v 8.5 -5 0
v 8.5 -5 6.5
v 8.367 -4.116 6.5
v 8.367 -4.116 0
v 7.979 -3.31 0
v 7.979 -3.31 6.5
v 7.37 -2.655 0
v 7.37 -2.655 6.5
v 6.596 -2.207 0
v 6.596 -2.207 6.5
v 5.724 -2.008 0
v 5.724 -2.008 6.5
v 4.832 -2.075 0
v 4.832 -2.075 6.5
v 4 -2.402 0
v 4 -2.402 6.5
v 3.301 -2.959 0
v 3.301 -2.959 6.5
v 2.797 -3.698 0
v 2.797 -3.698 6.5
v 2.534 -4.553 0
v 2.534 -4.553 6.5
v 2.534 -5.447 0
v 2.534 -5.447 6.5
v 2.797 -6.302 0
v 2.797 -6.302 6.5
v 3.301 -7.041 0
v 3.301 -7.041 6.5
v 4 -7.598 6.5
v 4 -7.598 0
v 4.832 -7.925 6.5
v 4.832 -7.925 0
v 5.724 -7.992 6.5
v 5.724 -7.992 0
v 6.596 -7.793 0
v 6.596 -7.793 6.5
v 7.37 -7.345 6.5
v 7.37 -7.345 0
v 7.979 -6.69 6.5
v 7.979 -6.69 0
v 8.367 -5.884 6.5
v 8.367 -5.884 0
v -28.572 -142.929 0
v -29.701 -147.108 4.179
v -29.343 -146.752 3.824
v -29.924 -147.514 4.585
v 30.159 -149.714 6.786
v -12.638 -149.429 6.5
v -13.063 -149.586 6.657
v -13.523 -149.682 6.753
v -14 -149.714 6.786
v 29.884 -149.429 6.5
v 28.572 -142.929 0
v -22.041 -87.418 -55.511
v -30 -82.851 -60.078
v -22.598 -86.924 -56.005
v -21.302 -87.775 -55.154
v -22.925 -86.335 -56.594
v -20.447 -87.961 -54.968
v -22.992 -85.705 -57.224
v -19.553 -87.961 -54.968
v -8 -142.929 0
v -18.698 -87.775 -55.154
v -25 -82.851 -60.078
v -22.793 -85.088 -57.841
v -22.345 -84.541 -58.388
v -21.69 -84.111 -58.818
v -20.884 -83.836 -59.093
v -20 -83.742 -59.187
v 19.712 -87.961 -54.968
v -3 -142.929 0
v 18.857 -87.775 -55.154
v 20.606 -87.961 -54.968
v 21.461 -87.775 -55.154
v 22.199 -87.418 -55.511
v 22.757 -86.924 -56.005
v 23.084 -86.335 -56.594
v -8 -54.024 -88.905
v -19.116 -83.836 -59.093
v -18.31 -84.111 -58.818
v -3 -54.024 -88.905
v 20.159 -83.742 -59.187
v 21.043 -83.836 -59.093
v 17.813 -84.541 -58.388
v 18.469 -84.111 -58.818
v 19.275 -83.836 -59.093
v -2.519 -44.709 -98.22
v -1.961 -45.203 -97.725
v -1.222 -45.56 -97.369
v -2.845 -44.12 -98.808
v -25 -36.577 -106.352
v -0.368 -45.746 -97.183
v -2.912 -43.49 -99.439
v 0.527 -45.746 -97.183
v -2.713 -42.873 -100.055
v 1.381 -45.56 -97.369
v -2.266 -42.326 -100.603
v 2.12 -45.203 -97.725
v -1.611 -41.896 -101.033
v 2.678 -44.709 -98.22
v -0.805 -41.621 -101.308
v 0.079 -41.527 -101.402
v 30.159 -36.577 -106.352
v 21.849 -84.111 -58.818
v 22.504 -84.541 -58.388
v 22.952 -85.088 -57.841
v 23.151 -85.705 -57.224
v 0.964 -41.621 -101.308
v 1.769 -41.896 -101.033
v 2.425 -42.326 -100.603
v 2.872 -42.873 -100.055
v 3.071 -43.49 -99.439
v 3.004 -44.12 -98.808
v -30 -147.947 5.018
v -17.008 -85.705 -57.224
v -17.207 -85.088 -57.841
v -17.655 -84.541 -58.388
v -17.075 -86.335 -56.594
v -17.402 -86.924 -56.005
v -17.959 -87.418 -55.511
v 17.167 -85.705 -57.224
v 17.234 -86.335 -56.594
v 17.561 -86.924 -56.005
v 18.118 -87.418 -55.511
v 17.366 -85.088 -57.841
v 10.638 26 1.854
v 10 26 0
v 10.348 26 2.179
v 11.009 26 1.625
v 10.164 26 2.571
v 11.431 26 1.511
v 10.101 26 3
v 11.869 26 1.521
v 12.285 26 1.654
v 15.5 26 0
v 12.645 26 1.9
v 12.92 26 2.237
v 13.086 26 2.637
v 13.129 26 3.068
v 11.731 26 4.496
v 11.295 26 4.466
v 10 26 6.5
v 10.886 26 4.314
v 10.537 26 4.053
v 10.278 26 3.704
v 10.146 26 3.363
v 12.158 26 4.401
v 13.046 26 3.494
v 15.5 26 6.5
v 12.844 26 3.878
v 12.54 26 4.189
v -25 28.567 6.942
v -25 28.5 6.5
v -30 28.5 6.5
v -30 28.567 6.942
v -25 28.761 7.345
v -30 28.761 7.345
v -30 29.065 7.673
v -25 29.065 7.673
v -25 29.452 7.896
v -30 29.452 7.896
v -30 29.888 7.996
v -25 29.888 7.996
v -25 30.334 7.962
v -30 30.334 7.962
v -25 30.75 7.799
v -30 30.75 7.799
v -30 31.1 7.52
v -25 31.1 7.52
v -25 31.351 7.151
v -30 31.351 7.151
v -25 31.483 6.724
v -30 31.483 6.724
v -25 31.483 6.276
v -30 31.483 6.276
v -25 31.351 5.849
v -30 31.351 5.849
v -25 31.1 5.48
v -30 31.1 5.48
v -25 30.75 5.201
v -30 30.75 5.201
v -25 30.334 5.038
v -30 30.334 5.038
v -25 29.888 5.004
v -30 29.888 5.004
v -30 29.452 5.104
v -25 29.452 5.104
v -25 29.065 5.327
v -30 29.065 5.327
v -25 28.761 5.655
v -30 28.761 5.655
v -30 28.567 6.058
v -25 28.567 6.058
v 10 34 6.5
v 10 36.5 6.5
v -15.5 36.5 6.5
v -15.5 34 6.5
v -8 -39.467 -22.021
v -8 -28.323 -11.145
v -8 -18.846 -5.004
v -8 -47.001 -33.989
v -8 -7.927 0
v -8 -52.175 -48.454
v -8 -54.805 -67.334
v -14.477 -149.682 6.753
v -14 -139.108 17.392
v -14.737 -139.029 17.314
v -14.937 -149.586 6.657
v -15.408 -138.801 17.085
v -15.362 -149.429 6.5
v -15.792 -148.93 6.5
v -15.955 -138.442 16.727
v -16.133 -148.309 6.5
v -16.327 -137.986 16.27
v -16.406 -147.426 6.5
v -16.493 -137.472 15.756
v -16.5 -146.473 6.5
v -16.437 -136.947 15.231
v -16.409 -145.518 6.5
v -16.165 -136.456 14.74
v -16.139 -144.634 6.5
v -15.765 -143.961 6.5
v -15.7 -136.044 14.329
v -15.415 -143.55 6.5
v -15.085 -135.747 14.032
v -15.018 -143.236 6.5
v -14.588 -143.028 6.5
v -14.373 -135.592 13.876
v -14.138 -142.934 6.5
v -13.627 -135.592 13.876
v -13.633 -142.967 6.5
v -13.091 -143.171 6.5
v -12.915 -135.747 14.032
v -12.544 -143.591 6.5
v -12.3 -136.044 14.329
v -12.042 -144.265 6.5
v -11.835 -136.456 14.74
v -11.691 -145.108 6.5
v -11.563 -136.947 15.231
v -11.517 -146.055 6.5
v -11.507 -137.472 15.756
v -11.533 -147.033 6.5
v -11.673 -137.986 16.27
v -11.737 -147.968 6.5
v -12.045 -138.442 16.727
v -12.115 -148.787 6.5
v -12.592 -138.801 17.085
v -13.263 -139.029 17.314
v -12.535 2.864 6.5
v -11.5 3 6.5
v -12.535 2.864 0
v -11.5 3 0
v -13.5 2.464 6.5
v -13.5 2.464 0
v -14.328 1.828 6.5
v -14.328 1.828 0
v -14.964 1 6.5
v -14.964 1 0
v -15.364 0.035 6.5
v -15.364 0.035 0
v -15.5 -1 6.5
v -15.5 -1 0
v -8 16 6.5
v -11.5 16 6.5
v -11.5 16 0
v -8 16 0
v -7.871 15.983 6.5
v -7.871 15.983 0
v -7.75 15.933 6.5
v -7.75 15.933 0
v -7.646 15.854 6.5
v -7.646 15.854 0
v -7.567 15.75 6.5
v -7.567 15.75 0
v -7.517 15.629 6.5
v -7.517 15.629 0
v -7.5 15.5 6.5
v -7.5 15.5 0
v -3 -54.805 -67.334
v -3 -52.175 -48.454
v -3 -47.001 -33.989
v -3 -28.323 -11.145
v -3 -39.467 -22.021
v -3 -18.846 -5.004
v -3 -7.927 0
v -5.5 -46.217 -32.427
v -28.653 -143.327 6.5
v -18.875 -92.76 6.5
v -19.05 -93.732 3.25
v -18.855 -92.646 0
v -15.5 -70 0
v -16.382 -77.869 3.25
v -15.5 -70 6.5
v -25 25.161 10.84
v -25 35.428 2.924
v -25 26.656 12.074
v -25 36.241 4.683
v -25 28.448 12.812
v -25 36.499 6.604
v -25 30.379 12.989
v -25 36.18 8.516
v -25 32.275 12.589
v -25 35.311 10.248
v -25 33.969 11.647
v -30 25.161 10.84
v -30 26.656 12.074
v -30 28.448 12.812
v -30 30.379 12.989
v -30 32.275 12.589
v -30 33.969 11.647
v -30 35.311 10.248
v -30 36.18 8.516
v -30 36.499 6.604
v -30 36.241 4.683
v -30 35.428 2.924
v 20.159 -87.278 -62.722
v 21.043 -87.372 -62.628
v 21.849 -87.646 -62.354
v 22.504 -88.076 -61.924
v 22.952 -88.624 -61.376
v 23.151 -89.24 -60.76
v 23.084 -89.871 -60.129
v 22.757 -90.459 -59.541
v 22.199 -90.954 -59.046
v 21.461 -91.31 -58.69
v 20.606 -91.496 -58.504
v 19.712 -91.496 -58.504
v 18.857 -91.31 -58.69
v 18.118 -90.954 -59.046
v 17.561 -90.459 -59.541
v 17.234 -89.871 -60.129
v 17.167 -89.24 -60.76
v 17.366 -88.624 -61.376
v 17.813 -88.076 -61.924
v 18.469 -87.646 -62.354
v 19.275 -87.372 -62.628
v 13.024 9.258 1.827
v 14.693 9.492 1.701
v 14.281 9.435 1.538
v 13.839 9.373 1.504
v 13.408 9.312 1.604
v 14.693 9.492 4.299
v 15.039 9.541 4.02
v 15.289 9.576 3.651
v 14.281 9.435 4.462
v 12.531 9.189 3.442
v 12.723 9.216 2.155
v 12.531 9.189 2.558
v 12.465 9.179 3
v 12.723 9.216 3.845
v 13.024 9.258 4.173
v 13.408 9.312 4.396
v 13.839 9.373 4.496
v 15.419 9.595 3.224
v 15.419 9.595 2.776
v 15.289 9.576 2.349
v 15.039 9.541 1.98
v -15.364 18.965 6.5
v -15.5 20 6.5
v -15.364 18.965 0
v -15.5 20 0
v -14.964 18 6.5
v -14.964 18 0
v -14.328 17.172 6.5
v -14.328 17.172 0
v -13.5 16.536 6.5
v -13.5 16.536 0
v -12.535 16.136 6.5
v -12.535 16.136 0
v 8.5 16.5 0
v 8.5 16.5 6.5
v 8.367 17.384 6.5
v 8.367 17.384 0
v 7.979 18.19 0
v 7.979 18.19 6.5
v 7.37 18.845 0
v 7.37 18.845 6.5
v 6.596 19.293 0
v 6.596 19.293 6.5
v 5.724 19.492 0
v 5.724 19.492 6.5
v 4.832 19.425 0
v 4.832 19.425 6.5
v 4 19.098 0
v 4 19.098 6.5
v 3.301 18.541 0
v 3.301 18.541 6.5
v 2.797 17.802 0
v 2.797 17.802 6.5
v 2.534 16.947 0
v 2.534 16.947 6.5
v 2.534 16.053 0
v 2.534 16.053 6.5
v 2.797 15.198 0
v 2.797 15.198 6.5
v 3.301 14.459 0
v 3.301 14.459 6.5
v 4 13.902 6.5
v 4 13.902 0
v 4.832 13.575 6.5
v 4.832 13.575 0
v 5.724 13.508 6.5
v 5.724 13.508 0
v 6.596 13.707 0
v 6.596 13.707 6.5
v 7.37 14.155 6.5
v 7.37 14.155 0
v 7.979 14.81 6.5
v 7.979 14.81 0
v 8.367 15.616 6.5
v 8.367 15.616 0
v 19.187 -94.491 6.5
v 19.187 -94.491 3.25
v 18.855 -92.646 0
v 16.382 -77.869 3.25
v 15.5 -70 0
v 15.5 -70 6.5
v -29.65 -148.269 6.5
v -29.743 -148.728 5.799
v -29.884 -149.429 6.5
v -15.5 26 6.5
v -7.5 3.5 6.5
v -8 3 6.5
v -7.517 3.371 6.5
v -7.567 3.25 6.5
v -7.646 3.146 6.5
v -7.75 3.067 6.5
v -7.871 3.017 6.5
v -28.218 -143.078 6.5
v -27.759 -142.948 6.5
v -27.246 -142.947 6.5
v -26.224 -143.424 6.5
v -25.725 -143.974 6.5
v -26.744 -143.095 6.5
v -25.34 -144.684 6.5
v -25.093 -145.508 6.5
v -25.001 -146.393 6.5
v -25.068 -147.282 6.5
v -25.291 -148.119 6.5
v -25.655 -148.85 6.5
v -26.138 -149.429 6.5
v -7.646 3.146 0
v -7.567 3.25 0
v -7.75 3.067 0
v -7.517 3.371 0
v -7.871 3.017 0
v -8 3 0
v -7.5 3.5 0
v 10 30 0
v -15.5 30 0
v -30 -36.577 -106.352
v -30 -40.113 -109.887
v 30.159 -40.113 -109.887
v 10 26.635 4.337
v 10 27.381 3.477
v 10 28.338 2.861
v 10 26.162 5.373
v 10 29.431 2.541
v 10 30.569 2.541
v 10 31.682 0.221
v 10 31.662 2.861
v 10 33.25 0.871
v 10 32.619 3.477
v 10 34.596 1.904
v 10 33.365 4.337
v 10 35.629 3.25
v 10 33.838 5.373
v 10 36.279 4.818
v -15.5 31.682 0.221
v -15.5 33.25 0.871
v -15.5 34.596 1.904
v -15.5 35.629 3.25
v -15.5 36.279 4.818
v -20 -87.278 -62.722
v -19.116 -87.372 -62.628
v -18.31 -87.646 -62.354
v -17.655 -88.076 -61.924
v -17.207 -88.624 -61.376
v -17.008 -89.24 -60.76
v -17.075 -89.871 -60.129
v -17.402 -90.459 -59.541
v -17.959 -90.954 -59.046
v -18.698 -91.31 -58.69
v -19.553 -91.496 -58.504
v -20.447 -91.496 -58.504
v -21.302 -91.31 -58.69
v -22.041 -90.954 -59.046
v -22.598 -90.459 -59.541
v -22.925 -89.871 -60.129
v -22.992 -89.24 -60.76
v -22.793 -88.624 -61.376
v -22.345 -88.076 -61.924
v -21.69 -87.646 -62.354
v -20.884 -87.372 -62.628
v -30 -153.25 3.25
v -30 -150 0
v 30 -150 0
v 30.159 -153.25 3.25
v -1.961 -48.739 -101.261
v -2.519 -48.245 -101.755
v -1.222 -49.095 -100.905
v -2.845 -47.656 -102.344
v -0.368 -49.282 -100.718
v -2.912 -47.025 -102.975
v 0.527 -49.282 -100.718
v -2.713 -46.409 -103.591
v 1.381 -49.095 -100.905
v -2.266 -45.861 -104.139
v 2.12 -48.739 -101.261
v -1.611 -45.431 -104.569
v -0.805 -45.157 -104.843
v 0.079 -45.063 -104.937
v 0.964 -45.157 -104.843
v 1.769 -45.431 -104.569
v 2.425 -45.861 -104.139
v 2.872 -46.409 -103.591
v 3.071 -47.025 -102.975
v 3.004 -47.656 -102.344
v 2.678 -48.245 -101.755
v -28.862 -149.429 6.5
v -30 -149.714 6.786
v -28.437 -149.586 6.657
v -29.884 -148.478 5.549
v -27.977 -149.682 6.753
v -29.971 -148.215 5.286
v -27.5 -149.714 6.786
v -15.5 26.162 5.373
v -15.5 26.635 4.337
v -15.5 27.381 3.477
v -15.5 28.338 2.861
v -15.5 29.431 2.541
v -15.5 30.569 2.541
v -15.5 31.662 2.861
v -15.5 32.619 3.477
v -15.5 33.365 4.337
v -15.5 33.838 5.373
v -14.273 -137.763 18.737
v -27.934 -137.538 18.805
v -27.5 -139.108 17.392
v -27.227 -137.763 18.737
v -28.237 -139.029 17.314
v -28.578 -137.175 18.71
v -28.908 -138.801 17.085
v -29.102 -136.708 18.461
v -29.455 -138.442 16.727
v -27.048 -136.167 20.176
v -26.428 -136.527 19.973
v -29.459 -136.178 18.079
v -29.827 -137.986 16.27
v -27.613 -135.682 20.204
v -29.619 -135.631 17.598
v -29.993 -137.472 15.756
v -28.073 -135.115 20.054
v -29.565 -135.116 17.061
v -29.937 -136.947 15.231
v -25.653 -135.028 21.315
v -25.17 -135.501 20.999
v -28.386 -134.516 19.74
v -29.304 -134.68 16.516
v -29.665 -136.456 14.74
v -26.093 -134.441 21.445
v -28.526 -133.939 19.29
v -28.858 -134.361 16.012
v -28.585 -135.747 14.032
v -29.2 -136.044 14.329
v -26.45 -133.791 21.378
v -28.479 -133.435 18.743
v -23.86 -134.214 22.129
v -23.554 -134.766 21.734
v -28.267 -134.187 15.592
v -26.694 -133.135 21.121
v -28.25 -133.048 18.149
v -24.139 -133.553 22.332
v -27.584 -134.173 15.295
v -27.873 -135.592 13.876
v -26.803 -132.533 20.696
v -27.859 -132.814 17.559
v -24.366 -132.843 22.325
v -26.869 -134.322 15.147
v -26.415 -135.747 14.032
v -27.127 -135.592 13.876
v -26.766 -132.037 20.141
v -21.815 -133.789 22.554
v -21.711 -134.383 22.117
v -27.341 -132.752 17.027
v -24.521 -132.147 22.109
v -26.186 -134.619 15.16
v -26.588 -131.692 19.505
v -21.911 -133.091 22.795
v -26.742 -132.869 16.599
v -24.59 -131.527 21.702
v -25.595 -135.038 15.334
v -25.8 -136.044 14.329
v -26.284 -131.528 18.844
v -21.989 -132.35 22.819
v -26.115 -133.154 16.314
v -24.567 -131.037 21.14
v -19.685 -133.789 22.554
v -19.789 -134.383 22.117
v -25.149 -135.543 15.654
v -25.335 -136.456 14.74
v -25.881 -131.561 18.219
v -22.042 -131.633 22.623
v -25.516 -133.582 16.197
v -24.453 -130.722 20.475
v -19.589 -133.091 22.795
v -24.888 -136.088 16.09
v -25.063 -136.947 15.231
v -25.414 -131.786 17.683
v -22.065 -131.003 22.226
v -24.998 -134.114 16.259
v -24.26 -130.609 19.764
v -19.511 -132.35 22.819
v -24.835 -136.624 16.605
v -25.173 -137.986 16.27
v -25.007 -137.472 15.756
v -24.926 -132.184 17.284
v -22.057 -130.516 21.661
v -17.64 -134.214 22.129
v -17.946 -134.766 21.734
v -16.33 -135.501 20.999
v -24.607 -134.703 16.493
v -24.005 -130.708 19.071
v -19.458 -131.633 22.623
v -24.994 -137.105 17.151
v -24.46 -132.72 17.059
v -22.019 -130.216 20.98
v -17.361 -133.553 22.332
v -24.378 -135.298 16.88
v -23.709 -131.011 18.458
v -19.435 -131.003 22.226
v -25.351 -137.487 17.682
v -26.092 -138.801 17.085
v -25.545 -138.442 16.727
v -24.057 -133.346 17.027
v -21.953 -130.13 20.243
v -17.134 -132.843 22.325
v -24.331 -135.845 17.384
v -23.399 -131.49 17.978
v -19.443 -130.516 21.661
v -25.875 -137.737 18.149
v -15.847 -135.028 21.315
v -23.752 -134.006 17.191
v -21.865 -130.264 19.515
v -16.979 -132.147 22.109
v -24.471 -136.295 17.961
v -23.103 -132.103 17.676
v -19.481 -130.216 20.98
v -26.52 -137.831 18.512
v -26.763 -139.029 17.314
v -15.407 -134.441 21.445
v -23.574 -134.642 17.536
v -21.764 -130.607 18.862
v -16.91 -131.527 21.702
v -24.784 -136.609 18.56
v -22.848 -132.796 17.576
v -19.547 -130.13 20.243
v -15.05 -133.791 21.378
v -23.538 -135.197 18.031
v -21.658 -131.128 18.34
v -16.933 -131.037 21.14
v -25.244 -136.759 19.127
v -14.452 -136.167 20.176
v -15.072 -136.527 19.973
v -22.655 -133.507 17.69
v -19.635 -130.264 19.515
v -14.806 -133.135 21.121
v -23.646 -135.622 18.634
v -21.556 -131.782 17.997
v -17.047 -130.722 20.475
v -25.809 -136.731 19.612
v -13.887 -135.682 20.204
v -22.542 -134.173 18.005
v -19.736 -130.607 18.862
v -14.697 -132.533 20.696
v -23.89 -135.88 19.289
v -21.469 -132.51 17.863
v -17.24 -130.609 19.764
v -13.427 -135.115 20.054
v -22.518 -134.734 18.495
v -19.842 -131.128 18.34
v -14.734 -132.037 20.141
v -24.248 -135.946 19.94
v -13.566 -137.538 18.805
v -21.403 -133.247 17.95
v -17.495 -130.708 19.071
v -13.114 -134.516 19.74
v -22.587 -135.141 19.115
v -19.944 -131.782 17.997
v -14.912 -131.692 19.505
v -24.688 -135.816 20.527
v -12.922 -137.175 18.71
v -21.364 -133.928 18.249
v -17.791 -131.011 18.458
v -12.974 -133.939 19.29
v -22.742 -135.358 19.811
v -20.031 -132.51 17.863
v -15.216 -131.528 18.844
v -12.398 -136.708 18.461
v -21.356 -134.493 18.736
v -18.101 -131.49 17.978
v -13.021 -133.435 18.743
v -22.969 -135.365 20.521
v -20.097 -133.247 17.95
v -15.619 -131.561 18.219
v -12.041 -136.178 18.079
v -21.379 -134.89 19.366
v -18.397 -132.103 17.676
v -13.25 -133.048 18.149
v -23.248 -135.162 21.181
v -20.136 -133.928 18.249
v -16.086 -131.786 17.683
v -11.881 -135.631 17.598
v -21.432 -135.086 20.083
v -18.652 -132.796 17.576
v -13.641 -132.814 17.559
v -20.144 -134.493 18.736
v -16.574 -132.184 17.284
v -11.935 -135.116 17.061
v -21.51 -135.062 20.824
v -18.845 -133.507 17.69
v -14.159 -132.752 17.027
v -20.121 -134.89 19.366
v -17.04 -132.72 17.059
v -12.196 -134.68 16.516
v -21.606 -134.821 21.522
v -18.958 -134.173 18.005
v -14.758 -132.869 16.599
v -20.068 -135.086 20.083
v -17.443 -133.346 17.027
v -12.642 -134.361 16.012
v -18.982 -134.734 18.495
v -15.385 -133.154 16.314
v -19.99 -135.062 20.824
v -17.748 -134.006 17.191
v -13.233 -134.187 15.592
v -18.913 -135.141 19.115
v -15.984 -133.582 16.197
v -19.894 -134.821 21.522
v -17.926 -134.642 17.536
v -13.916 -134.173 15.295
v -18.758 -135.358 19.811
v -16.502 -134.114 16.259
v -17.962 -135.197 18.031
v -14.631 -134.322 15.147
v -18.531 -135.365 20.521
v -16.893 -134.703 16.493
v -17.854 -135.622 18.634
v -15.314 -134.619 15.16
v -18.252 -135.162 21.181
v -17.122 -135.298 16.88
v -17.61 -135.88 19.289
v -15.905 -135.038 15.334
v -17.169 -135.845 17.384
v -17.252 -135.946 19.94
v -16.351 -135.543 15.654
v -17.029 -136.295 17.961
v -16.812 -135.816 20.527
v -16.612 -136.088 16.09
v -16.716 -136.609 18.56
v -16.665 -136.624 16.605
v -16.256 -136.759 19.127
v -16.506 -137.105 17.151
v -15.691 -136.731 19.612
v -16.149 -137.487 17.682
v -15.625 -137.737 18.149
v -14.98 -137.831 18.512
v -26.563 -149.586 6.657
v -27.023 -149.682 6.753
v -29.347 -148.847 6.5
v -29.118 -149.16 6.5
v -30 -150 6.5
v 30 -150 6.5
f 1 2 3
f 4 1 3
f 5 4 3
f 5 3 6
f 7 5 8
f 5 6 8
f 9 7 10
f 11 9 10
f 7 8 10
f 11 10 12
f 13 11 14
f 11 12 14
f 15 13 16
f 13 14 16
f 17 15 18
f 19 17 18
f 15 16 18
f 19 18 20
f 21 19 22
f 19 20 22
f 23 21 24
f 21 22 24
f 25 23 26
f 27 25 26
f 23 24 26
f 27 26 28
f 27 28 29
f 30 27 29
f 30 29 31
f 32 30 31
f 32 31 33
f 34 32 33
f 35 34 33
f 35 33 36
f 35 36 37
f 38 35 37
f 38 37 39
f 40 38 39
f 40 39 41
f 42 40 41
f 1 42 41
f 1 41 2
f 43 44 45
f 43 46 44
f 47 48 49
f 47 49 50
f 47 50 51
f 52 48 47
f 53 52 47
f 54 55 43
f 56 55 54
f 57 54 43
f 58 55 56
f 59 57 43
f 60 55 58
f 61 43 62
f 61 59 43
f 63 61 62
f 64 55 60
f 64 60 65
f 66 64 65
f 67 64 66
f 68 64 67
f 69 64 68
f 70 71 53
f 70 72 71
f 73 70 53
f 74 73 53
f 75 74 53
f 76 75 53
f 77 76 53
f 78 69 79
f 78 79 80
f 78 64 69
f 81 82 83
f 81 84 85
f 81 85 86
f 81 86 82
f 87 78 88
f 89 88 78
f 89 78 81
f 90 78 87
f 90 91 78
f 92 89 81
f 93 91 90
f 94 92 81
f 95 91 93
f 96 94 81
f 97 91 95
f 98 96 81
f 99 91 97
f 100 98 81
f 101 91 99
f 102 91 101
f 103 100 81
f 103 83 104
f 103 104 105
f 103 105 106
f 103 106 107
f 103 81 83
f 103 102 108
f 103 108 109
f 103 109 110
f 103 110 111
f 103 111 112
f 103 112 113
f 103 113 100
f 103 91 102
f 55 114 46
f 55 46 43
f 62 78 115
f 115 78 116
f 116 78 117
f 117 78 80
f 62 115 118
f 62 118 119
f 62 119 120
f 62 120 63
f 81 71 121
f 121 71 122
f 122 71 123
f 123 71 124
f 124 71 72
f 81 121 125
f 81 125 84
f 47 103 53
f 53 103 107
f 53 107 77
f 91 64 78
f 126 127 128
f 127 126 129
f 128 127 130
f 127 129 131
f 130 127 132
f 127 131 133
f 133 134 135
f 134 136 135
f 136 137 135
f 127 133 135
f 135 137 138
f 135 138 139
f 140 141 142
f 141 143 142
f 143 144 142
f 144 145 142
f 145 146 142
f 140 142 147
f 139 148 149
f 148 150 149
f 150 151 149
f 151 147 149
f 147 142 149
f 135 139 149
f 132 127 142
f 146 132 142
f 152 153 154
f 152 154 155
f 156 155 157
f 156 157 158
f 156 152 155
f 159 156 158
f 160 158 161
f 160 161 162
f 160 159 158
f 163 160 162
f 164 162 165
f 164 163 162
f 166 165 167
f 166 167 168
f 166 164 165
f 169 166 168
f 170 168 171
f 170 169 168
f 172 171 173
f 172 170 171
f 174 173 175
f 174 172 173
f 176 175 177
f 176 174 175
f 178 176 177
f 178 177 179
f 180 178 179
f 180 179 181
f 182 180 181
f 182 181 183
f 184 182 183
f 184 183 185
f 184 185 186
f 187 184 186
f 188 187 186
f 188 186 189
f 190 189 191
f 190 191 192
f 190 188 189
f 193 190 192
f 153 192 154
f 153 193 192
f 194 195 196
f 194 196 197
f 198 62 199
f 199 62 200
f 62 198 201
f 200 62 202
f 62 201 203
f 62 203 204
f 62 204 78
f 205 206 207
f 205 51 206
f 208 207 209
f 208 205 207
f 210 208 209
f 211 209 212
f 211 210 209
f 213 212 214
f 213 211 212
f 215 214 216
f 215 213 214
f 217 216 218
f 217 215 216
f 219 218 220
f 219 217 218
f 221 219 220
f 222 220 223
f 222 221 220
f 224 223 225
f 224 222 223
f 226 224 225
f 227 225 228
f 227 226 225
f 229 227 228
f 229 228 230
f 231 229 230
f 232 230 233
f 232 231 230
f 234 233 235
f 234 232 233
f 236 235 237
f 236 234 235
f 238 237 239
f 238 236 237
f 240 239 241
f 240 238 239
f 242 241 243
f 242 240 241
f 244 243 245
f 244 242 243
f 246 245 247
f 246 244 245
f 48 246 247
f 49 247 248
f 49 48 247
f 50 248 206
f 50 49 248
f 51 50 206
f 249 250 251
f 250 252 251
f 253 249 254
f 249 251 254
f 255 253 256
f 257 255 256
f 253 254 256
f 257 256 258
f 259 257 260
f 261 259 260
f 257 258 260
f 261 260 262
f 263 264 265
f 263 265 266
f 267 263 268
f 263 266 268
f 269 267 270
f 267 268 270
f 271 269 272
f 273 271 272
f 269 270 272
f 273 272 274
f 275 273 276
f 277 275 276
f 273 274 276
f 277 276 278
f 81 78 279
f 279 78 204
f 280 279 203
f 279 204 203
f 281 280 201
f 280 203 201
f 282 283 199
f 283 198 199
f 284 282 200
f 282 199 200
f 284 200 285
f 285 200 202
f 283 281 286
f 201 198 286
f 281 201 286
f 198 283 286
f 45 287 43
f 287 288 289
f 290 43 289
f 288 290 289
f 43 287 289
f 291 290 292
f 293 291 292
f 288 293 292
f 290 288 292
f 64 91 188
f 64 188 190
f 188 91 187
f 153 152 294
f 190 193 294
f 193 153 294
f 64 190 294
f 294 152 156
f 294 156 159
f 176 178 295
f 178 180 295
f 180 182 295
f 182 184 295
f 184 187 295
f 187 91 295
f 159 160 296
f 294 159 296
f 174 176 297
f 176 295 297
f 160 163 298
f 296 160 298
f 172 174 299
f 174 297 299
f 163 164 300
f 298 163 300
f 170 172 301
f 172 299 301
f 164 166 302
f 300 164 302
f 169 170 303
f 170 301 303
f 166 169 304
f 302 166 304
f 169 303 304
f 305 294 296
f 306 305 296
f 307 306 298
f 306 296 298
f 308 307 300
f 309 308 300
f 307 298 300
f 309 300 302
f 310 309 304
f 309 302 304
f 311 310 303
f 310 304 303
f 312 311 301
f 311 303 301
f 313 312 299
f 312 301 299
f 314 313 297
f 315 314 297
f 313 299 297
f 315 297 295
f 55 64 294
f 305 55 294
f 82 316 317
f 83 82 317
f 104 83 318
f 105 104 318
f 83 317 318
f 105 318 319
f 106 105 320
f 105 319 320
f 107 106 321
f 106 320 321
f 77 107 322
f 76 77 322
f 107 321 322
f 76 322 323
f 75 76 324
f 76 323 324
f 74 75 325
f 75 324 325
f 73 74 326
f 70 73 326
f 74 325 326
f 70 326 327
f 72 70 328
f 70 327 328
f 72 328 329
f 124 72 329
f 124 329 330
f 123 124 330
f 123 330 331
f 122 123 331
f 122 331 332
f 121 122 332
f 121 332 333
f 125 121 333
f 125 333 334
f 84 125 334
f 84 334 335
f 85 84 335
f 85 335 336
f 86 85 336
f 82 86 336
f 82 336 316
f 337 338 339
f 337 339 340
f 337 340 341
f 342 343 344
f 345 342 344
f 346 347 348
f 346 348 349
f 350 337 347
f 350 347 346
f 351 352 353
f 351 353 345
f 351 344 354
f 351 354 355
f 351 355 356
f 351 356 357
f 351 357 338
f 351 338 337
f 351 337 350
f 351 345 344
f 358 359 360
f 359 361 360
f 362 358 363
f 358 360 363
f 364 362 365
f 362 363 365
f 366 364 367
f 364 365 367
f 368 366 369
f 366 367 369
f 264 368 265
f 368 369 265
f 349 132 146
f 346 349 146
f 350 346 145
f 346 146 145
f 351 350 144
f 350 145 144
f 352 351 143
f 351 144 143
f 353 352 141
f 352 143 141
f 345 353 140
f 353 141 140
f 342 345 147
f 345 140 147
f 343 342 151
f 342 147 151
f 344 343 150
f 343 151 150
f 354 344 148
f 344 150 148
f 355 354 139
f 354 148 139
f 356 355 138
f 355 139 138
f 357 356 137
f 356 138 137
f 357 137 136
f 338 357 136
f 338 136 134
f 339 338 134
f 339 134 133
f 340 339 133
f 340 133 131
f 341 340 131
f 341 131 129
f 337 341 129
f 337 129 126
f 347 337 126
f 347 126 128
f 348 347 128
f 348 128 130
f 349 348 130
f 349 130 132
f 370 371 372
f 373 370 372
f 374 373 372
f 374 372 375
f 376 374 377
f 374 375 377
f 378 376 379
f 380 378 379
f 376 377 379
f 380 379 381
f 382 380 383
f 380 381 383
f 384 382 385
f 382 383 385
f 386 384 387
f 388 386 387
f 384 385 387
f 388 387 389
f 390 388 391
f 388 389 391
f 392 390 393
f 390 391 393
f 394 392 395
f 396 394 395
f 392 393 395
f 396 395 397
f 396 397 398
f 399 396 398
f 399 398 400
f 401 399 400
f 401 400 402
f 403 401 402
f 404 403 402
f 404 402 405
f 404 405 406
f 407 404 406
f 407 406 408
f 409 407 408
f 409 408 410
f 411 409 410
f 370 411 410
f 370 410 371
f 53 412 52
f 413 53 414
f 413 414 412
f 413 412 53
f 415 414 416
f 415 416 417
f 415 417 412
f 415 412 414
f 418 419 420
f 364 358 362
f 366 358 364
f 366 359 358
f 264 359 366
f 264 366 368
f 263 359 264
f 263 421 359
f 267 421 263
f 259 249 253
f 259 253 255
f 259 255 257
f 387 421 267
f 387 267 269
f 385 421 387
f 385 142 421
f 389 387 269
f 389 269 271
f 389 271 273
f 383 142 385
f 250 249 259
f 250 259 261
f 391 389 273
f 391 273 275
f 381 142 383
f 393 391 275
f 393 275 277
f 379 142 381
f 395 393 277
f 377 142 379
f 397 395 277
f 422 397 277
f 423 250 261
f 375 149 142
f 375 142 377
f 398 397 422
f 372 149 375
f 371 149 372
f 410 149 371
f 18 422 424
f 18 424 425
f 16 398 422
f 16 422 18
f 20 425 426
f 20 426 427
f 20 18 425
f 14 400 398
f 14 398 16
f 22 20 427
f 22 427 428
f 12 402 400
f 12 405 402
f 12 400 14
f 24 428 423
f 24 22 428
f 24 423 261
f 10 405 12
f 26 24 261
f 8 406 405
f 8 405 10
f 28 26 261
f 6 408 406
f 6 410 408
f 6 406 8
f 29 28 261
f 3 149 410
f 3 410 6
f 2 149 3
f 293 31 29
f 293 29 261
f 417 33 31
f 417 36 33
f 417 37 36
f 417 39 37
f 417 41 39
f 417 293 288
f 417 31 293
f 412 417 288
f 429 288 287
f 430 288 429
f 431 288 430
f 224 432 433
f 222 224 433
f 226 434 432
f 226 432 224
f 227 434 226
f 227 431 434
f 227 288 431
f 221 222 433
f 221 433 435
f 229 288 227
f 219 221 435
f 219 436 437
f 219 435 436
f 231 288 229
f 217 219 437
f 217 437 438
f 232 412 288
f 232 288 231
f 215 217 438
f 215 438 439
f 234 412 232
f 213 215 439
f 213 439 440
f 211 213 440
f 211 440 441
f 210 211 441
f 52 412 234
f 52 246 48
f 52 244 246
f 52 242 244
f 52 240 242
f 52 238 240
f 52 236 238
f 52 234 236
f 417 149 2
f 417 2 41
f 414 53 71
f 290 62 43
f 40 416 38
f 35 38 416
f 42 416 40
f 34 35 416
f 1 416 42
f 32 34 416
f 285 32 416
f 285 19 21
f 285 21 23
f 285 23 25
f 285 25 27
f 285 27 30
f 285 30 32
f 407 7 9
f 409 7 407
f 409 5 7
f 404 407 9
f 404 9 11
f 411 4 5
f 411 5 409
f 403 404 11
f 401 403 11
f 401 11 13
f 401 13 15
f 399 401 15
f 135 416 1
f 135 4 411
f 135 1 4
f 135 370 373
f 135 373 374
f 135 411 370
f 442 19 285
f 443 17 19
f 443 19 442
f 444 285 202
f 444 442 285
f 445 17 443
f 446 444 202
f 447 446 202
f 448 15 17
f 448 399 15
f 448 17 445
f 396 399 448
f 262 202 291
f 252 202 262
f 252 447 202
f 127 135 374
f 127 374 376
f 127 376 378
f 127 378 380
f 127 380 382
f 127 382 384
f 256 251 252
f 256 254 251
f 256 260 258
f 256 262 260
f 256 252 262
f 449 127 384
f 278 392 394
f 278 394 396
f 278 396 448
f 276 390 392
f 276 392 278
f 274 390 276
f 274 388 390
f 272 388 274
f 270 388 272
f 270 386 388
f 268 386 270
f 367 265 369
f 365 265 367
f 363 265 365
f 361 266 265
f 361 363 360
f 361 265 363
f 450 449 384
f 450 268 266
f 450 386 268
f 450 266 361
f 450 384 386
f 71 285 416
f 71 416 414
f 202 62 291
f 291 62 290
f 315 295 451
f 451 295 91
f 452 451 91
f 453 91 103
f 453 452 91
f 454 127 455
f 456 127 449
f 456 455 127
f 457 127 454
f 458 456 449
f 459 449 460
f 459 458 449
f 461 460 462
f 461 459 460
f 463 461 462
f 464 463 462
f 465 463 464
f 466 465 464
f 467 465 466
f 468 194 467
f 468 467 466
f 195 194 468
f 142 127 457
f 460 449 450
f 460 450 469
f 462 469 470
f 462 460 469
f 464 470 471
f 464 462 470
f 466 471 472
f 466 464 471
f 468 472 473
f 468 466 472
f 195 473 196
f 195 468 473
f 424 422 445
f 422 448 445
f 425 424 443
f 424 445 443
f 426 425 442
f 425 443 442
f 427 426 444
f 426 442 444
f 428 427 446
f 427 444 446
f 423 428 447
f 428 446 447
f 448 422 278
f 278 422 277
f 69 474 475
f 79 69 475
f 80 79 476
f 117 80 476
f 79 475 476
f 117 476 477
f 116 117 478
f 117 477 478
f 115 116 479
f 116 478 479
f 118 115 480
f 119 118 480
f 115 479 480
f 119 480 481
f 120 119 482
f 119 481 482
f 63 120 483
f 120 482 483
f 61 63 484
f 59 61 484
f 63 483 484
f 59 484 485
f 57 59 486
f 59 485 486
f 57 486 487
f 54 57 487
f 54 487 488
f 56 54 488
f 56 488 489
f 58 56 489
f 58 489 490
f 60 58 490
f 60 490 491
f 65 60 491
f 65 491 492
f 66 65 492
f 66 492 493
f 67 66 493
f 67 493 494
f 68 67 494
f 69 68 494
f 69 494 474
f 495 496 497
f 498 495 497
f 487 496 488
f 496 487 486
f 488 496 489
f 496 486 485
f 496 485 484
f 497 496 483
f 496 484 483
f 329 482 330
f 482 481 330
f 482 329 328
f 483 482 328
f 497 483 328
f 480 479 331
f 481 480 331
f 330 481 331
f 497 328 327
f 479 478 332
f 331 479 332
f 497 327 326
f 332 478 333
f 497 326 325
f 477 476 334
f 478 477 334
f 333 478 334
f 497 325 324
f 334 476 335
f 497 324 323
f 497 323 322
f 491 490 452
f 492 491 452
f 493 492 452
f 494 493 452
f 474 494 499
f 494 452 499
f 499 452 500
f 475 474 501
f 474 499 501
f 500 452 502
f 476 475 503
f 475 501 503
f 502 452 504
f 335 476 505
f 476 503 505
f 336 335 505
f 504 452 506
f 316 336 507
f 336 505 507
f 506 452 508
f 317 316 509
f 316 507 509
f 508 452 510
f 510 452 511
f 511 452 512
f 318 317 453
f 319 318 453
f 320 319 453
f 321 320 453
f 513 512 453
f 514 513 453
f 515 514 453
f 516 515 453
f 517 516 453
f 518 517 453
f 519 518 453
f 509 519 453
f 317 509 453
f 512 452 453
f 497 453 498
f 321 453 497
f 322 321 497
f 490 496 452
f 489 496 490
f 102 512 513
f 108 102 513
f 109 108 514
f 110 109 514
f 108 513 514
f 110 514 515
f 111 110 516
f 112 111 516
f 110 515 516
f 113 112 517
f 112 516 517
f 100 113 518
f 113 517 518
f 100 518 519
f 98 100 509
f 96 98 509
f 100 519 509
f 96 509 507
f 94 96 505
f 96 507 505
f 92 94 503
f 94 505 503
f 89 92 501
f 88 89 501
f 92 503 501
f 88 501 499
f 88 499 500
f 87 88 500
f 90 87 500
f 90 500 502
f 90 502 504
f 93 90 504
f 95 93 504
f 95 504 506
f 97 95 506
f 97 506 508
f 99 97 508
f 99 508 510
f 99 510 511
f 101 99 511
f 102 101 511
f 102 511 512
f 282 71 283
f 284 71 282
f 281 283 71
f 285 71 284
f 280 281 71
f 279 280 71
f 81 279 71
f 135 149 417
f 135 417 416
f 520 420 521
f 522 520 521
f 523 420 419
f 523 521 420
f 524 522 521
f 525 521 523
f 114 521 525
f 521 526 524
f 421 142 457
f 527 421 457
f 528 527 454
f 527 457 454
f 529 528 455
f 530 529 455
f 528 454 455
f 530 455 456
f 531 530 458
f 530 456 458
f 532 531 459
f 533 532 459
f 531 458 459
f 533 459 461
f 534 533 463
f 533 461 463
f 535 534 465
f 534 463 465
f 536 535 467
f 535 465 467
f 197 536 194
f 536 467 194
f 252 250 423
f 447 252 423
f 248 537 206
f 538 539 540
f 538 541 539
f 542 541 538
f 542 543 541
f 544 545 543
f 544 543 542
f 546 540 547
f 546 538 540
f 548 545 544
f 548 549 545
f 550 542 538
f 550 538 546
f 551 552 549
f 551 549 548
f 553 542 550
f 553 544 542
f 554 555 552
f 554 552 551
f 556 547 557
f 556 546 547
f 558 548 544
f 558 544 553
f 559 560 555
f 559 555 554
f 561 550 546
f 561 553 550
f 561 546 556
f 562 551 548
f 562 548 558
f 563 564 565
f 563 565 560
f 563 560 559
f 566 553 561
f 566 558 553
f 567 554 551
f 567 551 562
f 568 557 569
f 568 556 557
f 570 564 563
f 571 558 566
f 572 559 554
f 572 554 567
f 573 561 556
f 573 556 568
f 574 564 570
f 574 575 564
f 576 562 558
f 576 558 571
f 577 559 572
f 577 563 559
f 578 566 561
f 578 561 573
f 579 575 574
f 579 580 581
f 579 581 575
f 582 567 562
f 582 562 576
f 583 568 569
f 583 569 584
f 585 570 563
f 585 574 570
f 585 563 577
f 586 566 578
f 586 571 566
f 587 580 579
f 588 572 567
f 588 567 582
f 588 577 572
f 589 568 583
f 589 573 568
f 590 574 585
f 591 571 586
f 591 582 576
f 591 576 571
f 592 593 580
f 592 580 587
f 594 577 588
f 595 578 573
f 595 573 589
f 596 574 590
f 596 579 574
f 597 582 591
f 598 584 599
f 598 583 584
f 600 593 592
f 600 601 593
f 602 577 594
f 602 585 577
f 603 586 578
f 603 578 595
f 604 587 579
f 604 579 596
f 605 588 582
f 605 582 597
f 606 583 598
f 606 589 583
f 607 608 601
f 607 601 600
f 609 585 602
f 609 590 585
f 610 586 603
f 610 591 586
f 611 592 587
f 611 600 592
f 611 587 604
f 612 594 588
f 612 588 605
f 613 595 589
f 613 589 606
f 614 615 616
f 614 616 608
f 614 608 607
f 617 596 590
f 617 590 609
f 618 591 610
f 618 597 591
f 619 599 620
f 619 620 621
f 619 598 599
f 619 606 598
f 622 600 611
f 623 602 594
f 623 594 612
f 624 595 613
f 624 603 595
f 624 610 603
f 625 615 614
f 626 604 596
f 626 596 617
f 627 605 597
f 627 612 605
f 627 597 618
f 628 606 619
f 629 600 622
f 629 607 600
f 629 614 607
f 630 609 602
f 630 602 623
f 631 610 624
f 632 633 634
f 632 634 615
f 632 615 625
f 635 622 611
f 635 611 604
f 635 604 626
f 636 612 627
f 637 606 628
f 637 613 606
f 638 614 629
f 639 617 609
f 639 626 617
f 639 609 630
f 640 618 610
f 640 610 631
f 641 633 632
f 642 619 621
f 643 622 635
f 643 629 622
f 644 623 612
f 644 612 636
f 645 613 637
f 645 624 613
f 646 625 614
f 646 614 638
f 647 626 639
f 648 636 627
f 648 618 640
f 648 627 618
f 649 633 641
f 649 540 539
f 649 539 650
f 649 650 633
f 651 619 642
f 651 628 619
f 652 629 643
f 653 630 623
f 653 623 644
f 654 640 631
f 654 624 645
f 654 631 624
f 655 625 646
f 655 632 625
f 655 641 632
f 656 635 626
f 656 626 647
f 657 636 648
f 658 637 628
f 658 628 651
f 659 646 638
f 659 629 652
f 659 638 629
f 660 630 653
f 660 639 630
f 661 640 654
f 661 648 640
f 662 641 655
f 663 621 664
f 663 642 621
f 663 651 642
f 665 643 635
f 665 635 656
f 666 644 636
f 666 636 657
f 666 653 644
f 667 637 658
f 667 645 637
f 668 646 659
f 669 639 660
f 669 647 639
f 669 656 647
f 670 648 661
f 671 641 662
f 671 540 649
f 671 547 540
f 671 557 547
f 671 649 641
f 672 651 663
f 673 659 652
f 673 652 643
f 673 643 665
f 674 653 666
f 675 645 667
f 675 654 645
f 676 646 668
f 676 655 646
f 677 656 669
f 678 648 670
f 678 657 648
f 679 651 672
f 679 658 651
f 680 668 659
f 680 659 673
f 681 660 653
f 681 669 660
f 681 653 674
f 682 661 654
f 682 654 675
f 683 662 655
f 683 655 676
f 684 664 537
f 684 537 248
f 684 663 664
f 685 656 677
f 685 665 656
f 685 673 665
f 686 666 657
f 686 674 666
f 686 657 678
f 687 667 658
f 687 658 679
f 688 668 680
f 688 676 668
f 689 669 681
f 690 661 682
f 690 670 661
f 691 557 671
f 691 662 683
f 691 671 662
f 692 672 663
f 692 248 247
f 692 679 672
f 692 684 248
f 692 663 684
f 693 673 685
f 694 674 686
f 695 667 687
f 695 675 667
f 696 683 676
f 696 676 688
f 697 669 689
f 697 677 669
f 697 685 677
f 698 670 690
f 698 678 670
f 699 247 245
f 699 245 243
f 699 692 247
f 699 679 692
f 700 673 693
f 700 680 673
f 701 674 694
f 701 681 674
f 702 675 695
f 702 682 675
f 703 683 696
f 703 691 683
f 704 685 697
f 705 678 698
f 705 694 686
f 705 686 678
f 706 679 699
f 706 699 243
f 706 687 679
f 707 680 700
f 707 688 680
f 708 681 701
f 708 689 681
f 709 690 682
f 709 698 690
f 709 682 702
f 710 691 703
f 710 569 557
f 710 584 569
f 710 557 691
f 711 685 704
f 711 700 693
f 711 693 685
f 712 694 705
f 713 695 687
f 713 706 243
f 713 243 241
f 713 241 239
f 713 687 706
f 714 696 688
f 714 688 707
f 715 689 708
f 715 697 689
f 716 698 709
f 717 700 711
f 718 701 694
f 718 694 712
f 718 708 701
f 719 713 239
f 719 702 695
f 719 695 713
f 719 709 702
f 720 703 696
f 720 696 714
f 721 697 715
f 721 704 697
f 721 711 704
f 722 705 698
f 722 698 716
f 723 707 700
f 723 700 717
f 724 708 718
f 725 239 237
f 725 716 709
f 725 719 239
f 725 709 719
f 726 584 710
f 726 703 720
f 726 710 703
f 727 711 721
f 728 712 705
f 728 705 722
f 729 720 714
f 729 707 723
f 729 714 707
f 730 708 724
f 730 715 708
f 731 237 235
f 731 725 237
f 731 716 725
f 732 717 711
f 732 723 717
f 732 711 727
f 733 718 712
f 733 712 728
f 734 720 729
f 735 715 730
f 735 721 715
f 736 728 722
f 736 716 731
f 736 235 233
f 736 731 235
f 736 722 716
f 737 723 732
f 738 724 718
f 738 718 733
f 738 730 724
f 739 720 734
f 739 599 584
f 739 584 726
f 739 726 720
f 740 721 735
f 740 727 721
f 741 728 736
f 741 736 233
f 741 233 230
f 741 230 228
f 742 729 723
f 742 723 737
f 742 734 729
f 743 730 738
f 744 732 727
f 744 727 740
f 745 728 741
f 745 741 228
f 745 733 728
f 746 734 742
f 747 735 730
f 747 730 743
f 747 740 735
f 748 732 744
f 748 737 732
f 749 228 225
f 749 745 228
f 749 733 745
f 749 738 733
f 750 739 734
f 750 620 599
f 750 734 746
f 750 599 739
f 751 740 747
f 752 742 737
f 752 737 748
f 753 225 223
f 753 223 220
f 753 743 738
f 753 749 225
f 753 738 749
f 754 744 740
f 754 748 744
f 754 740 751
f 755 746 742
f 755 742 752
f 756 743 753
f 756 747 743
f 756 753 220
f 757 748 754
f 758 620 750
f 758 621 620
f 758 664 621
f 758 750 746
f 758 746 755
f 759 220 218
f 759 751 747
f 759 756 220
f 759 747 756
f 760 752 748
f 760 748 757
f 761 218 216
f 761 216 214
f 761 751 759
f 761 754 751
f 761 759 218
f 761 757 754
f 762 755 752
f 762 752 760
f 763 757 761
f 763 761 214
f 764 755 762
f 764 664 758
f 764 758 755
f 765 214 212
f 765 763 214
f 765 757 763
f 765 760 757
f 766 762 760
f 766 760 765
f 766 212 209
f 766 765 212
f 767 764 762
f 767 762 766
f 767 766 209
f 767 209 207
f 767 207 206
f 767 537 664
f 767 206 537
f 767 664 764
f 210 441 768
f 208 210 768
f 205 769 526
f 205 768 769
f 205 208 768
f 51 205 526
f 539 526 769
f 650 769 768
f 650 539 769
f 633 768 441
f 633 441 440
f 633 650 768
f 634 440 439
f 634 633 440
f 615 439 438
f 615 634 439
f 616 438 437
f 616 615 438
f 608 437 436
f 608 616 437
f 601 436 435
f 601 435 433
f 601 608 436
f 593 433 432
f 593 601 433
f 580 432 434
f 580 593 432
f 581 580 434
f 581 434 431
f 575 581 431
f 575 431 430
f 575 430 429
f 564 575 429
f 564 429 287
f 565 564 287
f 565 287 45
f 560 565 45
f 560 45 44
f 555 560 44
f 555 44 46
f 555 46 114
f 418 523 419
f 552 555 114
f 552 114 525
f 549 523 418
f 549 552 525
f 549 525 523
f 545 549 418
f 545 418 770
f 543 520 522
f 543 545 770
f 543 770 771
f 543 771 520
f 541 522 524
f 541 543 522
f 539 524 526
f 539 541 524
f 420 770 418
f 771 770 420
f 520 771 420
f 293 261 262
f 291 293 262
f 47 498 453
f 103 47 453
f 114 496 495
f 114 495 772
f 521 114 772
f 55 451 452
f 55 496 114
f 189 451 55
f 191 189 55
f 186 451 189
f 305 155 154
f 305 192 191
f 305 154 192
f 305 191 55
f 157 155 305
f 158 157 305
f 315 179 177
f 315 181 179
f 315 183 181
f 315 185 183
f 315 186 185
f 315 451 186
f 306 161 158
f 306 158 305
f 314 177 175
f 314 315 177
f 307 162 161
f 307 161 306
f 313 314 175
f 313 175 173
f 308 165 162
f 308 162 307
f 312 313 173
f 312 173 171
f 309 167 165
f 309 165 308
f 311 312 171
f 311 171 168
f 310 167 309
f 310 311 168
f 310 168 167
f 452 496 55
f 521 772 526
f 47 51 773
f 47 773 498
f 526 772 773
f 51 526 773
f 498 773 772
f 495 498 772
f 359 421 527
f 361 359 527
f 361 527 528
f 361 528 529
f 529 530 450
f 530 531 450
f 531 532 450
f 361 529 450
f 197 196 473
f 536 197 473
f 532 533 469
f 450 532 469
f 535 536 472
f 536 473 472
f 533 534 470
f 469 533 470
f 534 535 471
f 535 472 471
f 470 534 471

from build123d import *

# Parameters (mm, degrees)
BOSS_EXTRUDE1_DEPTH = 6.5
SKETCH2_W           = 60.158889846
SKETCH2_H           = 160
BOSS_EXTRUDE3_DEPTH = 5
SKETCH6_R           = 3
CUT_EXTRUDE7_DEPTH  = 5.1
BOSS_EXTRUDE4_DEPTH = 31
CUT_EXTRUDE8_REACH  = 196.785
SKETCH11_W          = 5.5
SKETCH11_H          = 10.5
CUT_EXTRUDE9_REACH  = 194.771
SKETCH13_R          = 1.5
CUT_EXTRUDE10_DEPTH = 17
CUT_EXTRUDE11_REACH = 196.785
SKETCH14_R          = 3
BOSS_EXTRUDE5_START = -5
SKETCH15_R          = 1.5
BOSS_EXTRUDE5_DEPTH = 5
RIB2_START          = -2.5
RIB2_DEPTH          = 5
CUT_EXTRUDE12_REACH = 196.785
SKETCH17_W          = 8
SKETCH17_H          = 13
FILLET1_R           = 4
FILLET2_R           = 0.5
SWEEP1_PROFILE_R    = 2.5


# Read off the part's stored shape, not the designer's step: Rib2
with BuildPart() as part:
    # Sketch1 → Boss-Extrude1 (new body)
    with BuildSketch(Plane.XY):
        with BuildLine():
            Line((-15.5, -70), (-15.5, 30))
            Line((-15.5, 30), (15.5, 30))
            Line((15.5, 30), (15.5, -70))
            add(Edge.make_bspline(
                [(15.5, -70), (15.682751911, -79.304401058), (30, -150)],
                knots=[0.243669215, 0.243669215, 0.243669215, 1, 1, 1], degree=2))
            Line((30, -150), (-30, -150))
            add(Edge.make_bspline(
                [(-15.5, -70), (-15.682751911, -79.304401058), (-30, -150)],
                knots=[0.243669215, 0.243669215, 0.243669215, 1, 1, 1], degree=2))
        make_face()
    extrude(amount=BOSS_EXTRUDE1_DEPTH)

    # Sketch2 → Boss-Extrude3 (add)
    with BuildSketch(Plane(origin=(0, -75, -75), x_dir=(1, 0, 0), z_dir=(0, 0.7071067811865488, 0.7071067811865464))):
        with Locations((0.079444923, -30.662211256)):
            Rectangle(SKETCH2_W, SKETCH2_H)
    extrude(amount=BOSS_EXTRUDE3_DEPTH)

    # Sketch6 → Cut-Extrude7 (cut)
    with BuildSketch(Plane(origin=(0, -75, -75), x_dir=(-1, 0, 0), z_dir=(0, -0.7071067811865487, -0.7071067811865464))):
        with Locations(Location((-20.158889846, -20.363007156, 0), (0, 0, 90))):
            Circle(SKETCH6_R)
        with Locations(Location((20, -20.363007156, 0), (0, 0, 90))):
            Circle(SKETCH6_R)
        with Locations(Location((-0.079444923, 39.337788744, 0), (0, 0, 90))):
            Circle(SKETCH6_R)
    extrude(amount=-CUT_EXTRUDE7_DEPTH, mode=Mode.SUBTRACT)

    # Sketch10 → Boss-Extrude4 (add)
    with BuildSketch(Plane(origin=(15.5, 0, 0), x_dir=(0, 0, -1), z_dir=(1, 0, 0))):
        with BuildLine():
            Line((-6.5, 36.5), (-6.5, 30))
            Line((-6.5, 30), (0, 30))
            ThreePointArc((0, 30), (-1.903805922, 34.596194078), (-6.5, 36.5))
        make_face()
    extrude(amount=-BOSS_EXTRUDE4_DEPTH)

    # Sketch11 → Cut-Extrude8 (cut, up to next)
    with BuildSketch(Plane.XY.offset(6.5), mode=Mode.PRIVATE) as cut_extrude8_sk1:
        with Locations((12.75, 31.25)):
            Rectangle(SKETCH11_W, SKETCH11_H)
    cut_extrude8_tool1 = extrude(cut_extrude8_sk1.sketch, amount=-CUT_EXTRUDE8_REACH, mode=Mode.PRIVATE) & part.part
    add(cut_extrude8_tool1.solids().sort_by_distance((12.75, 31.25, 6.5))[0], mode=Mode.SUBTRACT)

    # Sketch12 → Cut-Extrude9 (cut, up to next)
    with BuildSketch(Plane(origin=(10, 0, 0), x_dir=(0, 0, -1), z_dir=(1, 0, 0)), mode=Mode.PRIVATE) as cut_extrude9_sk1:
        with BuildLine():
            Line((-6.5, 34), (-6.5, 26))
            ThreePointArc((-6.5, 26), (-2.5, 30), (-6.5, 34))
        make_face()
    cut_extrude9_tool1 = extrude(cut_extrude9_sk1.sketch, amount=-CUT_EXTRUDE9_REACH, mode=Mode.PRIVATE) & part.part
    add(cut_extrude9_tool1.solids().sort_by_distance((10, 30, 4.802347))[0], mode=Mode.SUBTRACT)

    # Sketch13 → Cut-Extrude10 (cut)
    with BuildSketch(Plane(origin=(-3.389594105, 24.118215268, 0), x_dir=(0, 0, 1), z_dir=(-0.13917310096006605, 0.9902680687415703, 0))):
        with Locations(Location((3, 15.121181312, 0), (0, 0, 270))):
            Circle(SKETCH13_R)
    extrude(amount=-CUT_EXTRUDE10_DEPTH, mode=Mode.SUBTRACT)

    # Sketch14 → Cut-Extrude11 (cut, up to next)
    with BuildSketch(Plane.XY.offset(6.5), mode=Mode.PRIVATE) as cut_extrude11_sk1:
        with Locations((5.5, 16.5)):
            Circle(SKETCH14_R)
    cut_extrude11_tool1 = extrude(cut_extrude11_sk1.sketch, amount=-CUT_EXTRUDE11_REACH, mode=Mode.PRIVATE) & part.part
    # Sketch14 → Cut-Extrude11 (cut, up to next)
    with BuildSketch(Plane.XY.offset(6.5), mode=Mode.PRIVATE) as cut_extrude11_sk2:
        with Locations((5.5, -5)):
            Circle(SKETCH14_R)
    cut_extrude11_tool2 = extrude(cut_extrude11_sk2.sketch, amount=-CUT_EXTRUDE11_REACH, mode=Mode.PRIVATE) & part.part
    add(cut_extrude11_tool1.solids().sort_by_distance((5.5, 16.5, 6.5))[0], mode=Mode.SUBTRACT)
    add(cut_extrude11_tool2.solids().sort_by_distance((5.5, -5, 6.5))[0], mode=Mode.SUBTRACT)

    # Sketch15 → Boss-Extrude5 (add)
    with BuildSketch(Plane.ZY.offset(30).offset(BOSS_EXTRUDE5_START)):
        with BuildLine():
            Line((2.923559779, 35.427621518), (-106.351551084, -36.577381104))
            Line((-106.351551084, -36.577381104), (-60.077932214, -82.850999974))
            Line((-60.077932214, -82.850999974), (10.840158065, 25.161298937))
            ThreePointArc((10.840158065, 25.161298937), (11.647345051, 33.969236568), (2.923559779, 35.427621518))
        make_face()
        with Locations(Location((6.5, 30, 0), (0, 0, 270))):
            Circle(SKETCH15_R, mode=Mode.SUBTRACT)
    extrude(amount=BOSS_EXTRUDE5_DEPTH)

    # Rib2 outline → Rib2 (add)
    with BuildSketch(Plane(origin=(-5.5, 0, 0), x_dir=(0, 0, -1), z_dir=(1, 0, 0)).offset(RIB2_START)):
        with BuildLine():
            Line((0, -142.928932188), (88.904911914, -54.024020274))
            add(Edge.make_bspline(
                [(88.904911914, -54.024020274), (20.400745035, -61.458454661), (0, -7.927359395)],
                knots=[0, 0, 0, 1, 1, 1], degree=2))
            Line((0, -7.927359395), (0, -142.928932188))
        make_face()
    extrude(amount=RIB2_DEPTH)

    # Sketch17 → Cut-Extrude12 (cut, up to next)
    with BuildSketch(Plane.XY.offset(6.5), mode=Mode.PRIVATE) as cut_extrude12_sk1:
        with Locations((-11.5, 9.5)):
            Rectangle(SKETCH17_W, SKETCH17_H)
    cut_extrude12_tool1 = extrude(cut_extrude12_sk1.sketch, amount=-CUT_EXTRUDE12_REACH, mode=Mode.PRIVATE) & part.part
    add(cut_extrude12_tool1.solids().sort_by_distance((-11.5, 9.5, 6.5))[0], mode=Mode.SUBTRACT)

    # Fillet1
    fillet1_edges = [part.edges().sort_by_distance(p)[0] for p in [
        (-15.5, 3, 3.25),
        (-15.5, 16, 3.25),
    ]]
    fillet(fillet1_edges, radius=FILLET1_R)

    # Fillet2
    fillet2_edges = [part.edges().sort_by_distance(p)[0] for p in [
        (-7.5, 16, 3.25),
        (-7.5, 3, 3.25),
    ]]
    fillet(fillet2_edges, radius=FILLET2_R)

    # Sweep1: sweep along a path in Sketch18
    with BuildLine(Plane(origin=(0, -76.482233047, 76.482233047), x_dir=(-1, 0, 0), z_dir=(0, -0.7071067811865464, 0.7071067811865488))) as sweep1_path:
        Line((27.5, 101.066017178), (27.5, 86.066017178))
        ThreePointArc((27.5, 86.066017178), (20.75, 79.316017178), (14, 86.066017178))
        Line((14, 86.066017178), (14, 101.066017178))
    # Sweep1 profile (on start of the path) → Sweep1 (sweep)
    with BuildSketch(Plane(origin=(-27.5, -147.946699141, 5.017766953), x_dir=(0, -0.7071067811865464, 0.7071067811865488), z_dir=(0, 0.7071067811865488, 0.7071067811865464))):
        Circle(SWEEP1_PROFILE_R)
    sweep(path=sweep1_path.line)


solid = part.part
